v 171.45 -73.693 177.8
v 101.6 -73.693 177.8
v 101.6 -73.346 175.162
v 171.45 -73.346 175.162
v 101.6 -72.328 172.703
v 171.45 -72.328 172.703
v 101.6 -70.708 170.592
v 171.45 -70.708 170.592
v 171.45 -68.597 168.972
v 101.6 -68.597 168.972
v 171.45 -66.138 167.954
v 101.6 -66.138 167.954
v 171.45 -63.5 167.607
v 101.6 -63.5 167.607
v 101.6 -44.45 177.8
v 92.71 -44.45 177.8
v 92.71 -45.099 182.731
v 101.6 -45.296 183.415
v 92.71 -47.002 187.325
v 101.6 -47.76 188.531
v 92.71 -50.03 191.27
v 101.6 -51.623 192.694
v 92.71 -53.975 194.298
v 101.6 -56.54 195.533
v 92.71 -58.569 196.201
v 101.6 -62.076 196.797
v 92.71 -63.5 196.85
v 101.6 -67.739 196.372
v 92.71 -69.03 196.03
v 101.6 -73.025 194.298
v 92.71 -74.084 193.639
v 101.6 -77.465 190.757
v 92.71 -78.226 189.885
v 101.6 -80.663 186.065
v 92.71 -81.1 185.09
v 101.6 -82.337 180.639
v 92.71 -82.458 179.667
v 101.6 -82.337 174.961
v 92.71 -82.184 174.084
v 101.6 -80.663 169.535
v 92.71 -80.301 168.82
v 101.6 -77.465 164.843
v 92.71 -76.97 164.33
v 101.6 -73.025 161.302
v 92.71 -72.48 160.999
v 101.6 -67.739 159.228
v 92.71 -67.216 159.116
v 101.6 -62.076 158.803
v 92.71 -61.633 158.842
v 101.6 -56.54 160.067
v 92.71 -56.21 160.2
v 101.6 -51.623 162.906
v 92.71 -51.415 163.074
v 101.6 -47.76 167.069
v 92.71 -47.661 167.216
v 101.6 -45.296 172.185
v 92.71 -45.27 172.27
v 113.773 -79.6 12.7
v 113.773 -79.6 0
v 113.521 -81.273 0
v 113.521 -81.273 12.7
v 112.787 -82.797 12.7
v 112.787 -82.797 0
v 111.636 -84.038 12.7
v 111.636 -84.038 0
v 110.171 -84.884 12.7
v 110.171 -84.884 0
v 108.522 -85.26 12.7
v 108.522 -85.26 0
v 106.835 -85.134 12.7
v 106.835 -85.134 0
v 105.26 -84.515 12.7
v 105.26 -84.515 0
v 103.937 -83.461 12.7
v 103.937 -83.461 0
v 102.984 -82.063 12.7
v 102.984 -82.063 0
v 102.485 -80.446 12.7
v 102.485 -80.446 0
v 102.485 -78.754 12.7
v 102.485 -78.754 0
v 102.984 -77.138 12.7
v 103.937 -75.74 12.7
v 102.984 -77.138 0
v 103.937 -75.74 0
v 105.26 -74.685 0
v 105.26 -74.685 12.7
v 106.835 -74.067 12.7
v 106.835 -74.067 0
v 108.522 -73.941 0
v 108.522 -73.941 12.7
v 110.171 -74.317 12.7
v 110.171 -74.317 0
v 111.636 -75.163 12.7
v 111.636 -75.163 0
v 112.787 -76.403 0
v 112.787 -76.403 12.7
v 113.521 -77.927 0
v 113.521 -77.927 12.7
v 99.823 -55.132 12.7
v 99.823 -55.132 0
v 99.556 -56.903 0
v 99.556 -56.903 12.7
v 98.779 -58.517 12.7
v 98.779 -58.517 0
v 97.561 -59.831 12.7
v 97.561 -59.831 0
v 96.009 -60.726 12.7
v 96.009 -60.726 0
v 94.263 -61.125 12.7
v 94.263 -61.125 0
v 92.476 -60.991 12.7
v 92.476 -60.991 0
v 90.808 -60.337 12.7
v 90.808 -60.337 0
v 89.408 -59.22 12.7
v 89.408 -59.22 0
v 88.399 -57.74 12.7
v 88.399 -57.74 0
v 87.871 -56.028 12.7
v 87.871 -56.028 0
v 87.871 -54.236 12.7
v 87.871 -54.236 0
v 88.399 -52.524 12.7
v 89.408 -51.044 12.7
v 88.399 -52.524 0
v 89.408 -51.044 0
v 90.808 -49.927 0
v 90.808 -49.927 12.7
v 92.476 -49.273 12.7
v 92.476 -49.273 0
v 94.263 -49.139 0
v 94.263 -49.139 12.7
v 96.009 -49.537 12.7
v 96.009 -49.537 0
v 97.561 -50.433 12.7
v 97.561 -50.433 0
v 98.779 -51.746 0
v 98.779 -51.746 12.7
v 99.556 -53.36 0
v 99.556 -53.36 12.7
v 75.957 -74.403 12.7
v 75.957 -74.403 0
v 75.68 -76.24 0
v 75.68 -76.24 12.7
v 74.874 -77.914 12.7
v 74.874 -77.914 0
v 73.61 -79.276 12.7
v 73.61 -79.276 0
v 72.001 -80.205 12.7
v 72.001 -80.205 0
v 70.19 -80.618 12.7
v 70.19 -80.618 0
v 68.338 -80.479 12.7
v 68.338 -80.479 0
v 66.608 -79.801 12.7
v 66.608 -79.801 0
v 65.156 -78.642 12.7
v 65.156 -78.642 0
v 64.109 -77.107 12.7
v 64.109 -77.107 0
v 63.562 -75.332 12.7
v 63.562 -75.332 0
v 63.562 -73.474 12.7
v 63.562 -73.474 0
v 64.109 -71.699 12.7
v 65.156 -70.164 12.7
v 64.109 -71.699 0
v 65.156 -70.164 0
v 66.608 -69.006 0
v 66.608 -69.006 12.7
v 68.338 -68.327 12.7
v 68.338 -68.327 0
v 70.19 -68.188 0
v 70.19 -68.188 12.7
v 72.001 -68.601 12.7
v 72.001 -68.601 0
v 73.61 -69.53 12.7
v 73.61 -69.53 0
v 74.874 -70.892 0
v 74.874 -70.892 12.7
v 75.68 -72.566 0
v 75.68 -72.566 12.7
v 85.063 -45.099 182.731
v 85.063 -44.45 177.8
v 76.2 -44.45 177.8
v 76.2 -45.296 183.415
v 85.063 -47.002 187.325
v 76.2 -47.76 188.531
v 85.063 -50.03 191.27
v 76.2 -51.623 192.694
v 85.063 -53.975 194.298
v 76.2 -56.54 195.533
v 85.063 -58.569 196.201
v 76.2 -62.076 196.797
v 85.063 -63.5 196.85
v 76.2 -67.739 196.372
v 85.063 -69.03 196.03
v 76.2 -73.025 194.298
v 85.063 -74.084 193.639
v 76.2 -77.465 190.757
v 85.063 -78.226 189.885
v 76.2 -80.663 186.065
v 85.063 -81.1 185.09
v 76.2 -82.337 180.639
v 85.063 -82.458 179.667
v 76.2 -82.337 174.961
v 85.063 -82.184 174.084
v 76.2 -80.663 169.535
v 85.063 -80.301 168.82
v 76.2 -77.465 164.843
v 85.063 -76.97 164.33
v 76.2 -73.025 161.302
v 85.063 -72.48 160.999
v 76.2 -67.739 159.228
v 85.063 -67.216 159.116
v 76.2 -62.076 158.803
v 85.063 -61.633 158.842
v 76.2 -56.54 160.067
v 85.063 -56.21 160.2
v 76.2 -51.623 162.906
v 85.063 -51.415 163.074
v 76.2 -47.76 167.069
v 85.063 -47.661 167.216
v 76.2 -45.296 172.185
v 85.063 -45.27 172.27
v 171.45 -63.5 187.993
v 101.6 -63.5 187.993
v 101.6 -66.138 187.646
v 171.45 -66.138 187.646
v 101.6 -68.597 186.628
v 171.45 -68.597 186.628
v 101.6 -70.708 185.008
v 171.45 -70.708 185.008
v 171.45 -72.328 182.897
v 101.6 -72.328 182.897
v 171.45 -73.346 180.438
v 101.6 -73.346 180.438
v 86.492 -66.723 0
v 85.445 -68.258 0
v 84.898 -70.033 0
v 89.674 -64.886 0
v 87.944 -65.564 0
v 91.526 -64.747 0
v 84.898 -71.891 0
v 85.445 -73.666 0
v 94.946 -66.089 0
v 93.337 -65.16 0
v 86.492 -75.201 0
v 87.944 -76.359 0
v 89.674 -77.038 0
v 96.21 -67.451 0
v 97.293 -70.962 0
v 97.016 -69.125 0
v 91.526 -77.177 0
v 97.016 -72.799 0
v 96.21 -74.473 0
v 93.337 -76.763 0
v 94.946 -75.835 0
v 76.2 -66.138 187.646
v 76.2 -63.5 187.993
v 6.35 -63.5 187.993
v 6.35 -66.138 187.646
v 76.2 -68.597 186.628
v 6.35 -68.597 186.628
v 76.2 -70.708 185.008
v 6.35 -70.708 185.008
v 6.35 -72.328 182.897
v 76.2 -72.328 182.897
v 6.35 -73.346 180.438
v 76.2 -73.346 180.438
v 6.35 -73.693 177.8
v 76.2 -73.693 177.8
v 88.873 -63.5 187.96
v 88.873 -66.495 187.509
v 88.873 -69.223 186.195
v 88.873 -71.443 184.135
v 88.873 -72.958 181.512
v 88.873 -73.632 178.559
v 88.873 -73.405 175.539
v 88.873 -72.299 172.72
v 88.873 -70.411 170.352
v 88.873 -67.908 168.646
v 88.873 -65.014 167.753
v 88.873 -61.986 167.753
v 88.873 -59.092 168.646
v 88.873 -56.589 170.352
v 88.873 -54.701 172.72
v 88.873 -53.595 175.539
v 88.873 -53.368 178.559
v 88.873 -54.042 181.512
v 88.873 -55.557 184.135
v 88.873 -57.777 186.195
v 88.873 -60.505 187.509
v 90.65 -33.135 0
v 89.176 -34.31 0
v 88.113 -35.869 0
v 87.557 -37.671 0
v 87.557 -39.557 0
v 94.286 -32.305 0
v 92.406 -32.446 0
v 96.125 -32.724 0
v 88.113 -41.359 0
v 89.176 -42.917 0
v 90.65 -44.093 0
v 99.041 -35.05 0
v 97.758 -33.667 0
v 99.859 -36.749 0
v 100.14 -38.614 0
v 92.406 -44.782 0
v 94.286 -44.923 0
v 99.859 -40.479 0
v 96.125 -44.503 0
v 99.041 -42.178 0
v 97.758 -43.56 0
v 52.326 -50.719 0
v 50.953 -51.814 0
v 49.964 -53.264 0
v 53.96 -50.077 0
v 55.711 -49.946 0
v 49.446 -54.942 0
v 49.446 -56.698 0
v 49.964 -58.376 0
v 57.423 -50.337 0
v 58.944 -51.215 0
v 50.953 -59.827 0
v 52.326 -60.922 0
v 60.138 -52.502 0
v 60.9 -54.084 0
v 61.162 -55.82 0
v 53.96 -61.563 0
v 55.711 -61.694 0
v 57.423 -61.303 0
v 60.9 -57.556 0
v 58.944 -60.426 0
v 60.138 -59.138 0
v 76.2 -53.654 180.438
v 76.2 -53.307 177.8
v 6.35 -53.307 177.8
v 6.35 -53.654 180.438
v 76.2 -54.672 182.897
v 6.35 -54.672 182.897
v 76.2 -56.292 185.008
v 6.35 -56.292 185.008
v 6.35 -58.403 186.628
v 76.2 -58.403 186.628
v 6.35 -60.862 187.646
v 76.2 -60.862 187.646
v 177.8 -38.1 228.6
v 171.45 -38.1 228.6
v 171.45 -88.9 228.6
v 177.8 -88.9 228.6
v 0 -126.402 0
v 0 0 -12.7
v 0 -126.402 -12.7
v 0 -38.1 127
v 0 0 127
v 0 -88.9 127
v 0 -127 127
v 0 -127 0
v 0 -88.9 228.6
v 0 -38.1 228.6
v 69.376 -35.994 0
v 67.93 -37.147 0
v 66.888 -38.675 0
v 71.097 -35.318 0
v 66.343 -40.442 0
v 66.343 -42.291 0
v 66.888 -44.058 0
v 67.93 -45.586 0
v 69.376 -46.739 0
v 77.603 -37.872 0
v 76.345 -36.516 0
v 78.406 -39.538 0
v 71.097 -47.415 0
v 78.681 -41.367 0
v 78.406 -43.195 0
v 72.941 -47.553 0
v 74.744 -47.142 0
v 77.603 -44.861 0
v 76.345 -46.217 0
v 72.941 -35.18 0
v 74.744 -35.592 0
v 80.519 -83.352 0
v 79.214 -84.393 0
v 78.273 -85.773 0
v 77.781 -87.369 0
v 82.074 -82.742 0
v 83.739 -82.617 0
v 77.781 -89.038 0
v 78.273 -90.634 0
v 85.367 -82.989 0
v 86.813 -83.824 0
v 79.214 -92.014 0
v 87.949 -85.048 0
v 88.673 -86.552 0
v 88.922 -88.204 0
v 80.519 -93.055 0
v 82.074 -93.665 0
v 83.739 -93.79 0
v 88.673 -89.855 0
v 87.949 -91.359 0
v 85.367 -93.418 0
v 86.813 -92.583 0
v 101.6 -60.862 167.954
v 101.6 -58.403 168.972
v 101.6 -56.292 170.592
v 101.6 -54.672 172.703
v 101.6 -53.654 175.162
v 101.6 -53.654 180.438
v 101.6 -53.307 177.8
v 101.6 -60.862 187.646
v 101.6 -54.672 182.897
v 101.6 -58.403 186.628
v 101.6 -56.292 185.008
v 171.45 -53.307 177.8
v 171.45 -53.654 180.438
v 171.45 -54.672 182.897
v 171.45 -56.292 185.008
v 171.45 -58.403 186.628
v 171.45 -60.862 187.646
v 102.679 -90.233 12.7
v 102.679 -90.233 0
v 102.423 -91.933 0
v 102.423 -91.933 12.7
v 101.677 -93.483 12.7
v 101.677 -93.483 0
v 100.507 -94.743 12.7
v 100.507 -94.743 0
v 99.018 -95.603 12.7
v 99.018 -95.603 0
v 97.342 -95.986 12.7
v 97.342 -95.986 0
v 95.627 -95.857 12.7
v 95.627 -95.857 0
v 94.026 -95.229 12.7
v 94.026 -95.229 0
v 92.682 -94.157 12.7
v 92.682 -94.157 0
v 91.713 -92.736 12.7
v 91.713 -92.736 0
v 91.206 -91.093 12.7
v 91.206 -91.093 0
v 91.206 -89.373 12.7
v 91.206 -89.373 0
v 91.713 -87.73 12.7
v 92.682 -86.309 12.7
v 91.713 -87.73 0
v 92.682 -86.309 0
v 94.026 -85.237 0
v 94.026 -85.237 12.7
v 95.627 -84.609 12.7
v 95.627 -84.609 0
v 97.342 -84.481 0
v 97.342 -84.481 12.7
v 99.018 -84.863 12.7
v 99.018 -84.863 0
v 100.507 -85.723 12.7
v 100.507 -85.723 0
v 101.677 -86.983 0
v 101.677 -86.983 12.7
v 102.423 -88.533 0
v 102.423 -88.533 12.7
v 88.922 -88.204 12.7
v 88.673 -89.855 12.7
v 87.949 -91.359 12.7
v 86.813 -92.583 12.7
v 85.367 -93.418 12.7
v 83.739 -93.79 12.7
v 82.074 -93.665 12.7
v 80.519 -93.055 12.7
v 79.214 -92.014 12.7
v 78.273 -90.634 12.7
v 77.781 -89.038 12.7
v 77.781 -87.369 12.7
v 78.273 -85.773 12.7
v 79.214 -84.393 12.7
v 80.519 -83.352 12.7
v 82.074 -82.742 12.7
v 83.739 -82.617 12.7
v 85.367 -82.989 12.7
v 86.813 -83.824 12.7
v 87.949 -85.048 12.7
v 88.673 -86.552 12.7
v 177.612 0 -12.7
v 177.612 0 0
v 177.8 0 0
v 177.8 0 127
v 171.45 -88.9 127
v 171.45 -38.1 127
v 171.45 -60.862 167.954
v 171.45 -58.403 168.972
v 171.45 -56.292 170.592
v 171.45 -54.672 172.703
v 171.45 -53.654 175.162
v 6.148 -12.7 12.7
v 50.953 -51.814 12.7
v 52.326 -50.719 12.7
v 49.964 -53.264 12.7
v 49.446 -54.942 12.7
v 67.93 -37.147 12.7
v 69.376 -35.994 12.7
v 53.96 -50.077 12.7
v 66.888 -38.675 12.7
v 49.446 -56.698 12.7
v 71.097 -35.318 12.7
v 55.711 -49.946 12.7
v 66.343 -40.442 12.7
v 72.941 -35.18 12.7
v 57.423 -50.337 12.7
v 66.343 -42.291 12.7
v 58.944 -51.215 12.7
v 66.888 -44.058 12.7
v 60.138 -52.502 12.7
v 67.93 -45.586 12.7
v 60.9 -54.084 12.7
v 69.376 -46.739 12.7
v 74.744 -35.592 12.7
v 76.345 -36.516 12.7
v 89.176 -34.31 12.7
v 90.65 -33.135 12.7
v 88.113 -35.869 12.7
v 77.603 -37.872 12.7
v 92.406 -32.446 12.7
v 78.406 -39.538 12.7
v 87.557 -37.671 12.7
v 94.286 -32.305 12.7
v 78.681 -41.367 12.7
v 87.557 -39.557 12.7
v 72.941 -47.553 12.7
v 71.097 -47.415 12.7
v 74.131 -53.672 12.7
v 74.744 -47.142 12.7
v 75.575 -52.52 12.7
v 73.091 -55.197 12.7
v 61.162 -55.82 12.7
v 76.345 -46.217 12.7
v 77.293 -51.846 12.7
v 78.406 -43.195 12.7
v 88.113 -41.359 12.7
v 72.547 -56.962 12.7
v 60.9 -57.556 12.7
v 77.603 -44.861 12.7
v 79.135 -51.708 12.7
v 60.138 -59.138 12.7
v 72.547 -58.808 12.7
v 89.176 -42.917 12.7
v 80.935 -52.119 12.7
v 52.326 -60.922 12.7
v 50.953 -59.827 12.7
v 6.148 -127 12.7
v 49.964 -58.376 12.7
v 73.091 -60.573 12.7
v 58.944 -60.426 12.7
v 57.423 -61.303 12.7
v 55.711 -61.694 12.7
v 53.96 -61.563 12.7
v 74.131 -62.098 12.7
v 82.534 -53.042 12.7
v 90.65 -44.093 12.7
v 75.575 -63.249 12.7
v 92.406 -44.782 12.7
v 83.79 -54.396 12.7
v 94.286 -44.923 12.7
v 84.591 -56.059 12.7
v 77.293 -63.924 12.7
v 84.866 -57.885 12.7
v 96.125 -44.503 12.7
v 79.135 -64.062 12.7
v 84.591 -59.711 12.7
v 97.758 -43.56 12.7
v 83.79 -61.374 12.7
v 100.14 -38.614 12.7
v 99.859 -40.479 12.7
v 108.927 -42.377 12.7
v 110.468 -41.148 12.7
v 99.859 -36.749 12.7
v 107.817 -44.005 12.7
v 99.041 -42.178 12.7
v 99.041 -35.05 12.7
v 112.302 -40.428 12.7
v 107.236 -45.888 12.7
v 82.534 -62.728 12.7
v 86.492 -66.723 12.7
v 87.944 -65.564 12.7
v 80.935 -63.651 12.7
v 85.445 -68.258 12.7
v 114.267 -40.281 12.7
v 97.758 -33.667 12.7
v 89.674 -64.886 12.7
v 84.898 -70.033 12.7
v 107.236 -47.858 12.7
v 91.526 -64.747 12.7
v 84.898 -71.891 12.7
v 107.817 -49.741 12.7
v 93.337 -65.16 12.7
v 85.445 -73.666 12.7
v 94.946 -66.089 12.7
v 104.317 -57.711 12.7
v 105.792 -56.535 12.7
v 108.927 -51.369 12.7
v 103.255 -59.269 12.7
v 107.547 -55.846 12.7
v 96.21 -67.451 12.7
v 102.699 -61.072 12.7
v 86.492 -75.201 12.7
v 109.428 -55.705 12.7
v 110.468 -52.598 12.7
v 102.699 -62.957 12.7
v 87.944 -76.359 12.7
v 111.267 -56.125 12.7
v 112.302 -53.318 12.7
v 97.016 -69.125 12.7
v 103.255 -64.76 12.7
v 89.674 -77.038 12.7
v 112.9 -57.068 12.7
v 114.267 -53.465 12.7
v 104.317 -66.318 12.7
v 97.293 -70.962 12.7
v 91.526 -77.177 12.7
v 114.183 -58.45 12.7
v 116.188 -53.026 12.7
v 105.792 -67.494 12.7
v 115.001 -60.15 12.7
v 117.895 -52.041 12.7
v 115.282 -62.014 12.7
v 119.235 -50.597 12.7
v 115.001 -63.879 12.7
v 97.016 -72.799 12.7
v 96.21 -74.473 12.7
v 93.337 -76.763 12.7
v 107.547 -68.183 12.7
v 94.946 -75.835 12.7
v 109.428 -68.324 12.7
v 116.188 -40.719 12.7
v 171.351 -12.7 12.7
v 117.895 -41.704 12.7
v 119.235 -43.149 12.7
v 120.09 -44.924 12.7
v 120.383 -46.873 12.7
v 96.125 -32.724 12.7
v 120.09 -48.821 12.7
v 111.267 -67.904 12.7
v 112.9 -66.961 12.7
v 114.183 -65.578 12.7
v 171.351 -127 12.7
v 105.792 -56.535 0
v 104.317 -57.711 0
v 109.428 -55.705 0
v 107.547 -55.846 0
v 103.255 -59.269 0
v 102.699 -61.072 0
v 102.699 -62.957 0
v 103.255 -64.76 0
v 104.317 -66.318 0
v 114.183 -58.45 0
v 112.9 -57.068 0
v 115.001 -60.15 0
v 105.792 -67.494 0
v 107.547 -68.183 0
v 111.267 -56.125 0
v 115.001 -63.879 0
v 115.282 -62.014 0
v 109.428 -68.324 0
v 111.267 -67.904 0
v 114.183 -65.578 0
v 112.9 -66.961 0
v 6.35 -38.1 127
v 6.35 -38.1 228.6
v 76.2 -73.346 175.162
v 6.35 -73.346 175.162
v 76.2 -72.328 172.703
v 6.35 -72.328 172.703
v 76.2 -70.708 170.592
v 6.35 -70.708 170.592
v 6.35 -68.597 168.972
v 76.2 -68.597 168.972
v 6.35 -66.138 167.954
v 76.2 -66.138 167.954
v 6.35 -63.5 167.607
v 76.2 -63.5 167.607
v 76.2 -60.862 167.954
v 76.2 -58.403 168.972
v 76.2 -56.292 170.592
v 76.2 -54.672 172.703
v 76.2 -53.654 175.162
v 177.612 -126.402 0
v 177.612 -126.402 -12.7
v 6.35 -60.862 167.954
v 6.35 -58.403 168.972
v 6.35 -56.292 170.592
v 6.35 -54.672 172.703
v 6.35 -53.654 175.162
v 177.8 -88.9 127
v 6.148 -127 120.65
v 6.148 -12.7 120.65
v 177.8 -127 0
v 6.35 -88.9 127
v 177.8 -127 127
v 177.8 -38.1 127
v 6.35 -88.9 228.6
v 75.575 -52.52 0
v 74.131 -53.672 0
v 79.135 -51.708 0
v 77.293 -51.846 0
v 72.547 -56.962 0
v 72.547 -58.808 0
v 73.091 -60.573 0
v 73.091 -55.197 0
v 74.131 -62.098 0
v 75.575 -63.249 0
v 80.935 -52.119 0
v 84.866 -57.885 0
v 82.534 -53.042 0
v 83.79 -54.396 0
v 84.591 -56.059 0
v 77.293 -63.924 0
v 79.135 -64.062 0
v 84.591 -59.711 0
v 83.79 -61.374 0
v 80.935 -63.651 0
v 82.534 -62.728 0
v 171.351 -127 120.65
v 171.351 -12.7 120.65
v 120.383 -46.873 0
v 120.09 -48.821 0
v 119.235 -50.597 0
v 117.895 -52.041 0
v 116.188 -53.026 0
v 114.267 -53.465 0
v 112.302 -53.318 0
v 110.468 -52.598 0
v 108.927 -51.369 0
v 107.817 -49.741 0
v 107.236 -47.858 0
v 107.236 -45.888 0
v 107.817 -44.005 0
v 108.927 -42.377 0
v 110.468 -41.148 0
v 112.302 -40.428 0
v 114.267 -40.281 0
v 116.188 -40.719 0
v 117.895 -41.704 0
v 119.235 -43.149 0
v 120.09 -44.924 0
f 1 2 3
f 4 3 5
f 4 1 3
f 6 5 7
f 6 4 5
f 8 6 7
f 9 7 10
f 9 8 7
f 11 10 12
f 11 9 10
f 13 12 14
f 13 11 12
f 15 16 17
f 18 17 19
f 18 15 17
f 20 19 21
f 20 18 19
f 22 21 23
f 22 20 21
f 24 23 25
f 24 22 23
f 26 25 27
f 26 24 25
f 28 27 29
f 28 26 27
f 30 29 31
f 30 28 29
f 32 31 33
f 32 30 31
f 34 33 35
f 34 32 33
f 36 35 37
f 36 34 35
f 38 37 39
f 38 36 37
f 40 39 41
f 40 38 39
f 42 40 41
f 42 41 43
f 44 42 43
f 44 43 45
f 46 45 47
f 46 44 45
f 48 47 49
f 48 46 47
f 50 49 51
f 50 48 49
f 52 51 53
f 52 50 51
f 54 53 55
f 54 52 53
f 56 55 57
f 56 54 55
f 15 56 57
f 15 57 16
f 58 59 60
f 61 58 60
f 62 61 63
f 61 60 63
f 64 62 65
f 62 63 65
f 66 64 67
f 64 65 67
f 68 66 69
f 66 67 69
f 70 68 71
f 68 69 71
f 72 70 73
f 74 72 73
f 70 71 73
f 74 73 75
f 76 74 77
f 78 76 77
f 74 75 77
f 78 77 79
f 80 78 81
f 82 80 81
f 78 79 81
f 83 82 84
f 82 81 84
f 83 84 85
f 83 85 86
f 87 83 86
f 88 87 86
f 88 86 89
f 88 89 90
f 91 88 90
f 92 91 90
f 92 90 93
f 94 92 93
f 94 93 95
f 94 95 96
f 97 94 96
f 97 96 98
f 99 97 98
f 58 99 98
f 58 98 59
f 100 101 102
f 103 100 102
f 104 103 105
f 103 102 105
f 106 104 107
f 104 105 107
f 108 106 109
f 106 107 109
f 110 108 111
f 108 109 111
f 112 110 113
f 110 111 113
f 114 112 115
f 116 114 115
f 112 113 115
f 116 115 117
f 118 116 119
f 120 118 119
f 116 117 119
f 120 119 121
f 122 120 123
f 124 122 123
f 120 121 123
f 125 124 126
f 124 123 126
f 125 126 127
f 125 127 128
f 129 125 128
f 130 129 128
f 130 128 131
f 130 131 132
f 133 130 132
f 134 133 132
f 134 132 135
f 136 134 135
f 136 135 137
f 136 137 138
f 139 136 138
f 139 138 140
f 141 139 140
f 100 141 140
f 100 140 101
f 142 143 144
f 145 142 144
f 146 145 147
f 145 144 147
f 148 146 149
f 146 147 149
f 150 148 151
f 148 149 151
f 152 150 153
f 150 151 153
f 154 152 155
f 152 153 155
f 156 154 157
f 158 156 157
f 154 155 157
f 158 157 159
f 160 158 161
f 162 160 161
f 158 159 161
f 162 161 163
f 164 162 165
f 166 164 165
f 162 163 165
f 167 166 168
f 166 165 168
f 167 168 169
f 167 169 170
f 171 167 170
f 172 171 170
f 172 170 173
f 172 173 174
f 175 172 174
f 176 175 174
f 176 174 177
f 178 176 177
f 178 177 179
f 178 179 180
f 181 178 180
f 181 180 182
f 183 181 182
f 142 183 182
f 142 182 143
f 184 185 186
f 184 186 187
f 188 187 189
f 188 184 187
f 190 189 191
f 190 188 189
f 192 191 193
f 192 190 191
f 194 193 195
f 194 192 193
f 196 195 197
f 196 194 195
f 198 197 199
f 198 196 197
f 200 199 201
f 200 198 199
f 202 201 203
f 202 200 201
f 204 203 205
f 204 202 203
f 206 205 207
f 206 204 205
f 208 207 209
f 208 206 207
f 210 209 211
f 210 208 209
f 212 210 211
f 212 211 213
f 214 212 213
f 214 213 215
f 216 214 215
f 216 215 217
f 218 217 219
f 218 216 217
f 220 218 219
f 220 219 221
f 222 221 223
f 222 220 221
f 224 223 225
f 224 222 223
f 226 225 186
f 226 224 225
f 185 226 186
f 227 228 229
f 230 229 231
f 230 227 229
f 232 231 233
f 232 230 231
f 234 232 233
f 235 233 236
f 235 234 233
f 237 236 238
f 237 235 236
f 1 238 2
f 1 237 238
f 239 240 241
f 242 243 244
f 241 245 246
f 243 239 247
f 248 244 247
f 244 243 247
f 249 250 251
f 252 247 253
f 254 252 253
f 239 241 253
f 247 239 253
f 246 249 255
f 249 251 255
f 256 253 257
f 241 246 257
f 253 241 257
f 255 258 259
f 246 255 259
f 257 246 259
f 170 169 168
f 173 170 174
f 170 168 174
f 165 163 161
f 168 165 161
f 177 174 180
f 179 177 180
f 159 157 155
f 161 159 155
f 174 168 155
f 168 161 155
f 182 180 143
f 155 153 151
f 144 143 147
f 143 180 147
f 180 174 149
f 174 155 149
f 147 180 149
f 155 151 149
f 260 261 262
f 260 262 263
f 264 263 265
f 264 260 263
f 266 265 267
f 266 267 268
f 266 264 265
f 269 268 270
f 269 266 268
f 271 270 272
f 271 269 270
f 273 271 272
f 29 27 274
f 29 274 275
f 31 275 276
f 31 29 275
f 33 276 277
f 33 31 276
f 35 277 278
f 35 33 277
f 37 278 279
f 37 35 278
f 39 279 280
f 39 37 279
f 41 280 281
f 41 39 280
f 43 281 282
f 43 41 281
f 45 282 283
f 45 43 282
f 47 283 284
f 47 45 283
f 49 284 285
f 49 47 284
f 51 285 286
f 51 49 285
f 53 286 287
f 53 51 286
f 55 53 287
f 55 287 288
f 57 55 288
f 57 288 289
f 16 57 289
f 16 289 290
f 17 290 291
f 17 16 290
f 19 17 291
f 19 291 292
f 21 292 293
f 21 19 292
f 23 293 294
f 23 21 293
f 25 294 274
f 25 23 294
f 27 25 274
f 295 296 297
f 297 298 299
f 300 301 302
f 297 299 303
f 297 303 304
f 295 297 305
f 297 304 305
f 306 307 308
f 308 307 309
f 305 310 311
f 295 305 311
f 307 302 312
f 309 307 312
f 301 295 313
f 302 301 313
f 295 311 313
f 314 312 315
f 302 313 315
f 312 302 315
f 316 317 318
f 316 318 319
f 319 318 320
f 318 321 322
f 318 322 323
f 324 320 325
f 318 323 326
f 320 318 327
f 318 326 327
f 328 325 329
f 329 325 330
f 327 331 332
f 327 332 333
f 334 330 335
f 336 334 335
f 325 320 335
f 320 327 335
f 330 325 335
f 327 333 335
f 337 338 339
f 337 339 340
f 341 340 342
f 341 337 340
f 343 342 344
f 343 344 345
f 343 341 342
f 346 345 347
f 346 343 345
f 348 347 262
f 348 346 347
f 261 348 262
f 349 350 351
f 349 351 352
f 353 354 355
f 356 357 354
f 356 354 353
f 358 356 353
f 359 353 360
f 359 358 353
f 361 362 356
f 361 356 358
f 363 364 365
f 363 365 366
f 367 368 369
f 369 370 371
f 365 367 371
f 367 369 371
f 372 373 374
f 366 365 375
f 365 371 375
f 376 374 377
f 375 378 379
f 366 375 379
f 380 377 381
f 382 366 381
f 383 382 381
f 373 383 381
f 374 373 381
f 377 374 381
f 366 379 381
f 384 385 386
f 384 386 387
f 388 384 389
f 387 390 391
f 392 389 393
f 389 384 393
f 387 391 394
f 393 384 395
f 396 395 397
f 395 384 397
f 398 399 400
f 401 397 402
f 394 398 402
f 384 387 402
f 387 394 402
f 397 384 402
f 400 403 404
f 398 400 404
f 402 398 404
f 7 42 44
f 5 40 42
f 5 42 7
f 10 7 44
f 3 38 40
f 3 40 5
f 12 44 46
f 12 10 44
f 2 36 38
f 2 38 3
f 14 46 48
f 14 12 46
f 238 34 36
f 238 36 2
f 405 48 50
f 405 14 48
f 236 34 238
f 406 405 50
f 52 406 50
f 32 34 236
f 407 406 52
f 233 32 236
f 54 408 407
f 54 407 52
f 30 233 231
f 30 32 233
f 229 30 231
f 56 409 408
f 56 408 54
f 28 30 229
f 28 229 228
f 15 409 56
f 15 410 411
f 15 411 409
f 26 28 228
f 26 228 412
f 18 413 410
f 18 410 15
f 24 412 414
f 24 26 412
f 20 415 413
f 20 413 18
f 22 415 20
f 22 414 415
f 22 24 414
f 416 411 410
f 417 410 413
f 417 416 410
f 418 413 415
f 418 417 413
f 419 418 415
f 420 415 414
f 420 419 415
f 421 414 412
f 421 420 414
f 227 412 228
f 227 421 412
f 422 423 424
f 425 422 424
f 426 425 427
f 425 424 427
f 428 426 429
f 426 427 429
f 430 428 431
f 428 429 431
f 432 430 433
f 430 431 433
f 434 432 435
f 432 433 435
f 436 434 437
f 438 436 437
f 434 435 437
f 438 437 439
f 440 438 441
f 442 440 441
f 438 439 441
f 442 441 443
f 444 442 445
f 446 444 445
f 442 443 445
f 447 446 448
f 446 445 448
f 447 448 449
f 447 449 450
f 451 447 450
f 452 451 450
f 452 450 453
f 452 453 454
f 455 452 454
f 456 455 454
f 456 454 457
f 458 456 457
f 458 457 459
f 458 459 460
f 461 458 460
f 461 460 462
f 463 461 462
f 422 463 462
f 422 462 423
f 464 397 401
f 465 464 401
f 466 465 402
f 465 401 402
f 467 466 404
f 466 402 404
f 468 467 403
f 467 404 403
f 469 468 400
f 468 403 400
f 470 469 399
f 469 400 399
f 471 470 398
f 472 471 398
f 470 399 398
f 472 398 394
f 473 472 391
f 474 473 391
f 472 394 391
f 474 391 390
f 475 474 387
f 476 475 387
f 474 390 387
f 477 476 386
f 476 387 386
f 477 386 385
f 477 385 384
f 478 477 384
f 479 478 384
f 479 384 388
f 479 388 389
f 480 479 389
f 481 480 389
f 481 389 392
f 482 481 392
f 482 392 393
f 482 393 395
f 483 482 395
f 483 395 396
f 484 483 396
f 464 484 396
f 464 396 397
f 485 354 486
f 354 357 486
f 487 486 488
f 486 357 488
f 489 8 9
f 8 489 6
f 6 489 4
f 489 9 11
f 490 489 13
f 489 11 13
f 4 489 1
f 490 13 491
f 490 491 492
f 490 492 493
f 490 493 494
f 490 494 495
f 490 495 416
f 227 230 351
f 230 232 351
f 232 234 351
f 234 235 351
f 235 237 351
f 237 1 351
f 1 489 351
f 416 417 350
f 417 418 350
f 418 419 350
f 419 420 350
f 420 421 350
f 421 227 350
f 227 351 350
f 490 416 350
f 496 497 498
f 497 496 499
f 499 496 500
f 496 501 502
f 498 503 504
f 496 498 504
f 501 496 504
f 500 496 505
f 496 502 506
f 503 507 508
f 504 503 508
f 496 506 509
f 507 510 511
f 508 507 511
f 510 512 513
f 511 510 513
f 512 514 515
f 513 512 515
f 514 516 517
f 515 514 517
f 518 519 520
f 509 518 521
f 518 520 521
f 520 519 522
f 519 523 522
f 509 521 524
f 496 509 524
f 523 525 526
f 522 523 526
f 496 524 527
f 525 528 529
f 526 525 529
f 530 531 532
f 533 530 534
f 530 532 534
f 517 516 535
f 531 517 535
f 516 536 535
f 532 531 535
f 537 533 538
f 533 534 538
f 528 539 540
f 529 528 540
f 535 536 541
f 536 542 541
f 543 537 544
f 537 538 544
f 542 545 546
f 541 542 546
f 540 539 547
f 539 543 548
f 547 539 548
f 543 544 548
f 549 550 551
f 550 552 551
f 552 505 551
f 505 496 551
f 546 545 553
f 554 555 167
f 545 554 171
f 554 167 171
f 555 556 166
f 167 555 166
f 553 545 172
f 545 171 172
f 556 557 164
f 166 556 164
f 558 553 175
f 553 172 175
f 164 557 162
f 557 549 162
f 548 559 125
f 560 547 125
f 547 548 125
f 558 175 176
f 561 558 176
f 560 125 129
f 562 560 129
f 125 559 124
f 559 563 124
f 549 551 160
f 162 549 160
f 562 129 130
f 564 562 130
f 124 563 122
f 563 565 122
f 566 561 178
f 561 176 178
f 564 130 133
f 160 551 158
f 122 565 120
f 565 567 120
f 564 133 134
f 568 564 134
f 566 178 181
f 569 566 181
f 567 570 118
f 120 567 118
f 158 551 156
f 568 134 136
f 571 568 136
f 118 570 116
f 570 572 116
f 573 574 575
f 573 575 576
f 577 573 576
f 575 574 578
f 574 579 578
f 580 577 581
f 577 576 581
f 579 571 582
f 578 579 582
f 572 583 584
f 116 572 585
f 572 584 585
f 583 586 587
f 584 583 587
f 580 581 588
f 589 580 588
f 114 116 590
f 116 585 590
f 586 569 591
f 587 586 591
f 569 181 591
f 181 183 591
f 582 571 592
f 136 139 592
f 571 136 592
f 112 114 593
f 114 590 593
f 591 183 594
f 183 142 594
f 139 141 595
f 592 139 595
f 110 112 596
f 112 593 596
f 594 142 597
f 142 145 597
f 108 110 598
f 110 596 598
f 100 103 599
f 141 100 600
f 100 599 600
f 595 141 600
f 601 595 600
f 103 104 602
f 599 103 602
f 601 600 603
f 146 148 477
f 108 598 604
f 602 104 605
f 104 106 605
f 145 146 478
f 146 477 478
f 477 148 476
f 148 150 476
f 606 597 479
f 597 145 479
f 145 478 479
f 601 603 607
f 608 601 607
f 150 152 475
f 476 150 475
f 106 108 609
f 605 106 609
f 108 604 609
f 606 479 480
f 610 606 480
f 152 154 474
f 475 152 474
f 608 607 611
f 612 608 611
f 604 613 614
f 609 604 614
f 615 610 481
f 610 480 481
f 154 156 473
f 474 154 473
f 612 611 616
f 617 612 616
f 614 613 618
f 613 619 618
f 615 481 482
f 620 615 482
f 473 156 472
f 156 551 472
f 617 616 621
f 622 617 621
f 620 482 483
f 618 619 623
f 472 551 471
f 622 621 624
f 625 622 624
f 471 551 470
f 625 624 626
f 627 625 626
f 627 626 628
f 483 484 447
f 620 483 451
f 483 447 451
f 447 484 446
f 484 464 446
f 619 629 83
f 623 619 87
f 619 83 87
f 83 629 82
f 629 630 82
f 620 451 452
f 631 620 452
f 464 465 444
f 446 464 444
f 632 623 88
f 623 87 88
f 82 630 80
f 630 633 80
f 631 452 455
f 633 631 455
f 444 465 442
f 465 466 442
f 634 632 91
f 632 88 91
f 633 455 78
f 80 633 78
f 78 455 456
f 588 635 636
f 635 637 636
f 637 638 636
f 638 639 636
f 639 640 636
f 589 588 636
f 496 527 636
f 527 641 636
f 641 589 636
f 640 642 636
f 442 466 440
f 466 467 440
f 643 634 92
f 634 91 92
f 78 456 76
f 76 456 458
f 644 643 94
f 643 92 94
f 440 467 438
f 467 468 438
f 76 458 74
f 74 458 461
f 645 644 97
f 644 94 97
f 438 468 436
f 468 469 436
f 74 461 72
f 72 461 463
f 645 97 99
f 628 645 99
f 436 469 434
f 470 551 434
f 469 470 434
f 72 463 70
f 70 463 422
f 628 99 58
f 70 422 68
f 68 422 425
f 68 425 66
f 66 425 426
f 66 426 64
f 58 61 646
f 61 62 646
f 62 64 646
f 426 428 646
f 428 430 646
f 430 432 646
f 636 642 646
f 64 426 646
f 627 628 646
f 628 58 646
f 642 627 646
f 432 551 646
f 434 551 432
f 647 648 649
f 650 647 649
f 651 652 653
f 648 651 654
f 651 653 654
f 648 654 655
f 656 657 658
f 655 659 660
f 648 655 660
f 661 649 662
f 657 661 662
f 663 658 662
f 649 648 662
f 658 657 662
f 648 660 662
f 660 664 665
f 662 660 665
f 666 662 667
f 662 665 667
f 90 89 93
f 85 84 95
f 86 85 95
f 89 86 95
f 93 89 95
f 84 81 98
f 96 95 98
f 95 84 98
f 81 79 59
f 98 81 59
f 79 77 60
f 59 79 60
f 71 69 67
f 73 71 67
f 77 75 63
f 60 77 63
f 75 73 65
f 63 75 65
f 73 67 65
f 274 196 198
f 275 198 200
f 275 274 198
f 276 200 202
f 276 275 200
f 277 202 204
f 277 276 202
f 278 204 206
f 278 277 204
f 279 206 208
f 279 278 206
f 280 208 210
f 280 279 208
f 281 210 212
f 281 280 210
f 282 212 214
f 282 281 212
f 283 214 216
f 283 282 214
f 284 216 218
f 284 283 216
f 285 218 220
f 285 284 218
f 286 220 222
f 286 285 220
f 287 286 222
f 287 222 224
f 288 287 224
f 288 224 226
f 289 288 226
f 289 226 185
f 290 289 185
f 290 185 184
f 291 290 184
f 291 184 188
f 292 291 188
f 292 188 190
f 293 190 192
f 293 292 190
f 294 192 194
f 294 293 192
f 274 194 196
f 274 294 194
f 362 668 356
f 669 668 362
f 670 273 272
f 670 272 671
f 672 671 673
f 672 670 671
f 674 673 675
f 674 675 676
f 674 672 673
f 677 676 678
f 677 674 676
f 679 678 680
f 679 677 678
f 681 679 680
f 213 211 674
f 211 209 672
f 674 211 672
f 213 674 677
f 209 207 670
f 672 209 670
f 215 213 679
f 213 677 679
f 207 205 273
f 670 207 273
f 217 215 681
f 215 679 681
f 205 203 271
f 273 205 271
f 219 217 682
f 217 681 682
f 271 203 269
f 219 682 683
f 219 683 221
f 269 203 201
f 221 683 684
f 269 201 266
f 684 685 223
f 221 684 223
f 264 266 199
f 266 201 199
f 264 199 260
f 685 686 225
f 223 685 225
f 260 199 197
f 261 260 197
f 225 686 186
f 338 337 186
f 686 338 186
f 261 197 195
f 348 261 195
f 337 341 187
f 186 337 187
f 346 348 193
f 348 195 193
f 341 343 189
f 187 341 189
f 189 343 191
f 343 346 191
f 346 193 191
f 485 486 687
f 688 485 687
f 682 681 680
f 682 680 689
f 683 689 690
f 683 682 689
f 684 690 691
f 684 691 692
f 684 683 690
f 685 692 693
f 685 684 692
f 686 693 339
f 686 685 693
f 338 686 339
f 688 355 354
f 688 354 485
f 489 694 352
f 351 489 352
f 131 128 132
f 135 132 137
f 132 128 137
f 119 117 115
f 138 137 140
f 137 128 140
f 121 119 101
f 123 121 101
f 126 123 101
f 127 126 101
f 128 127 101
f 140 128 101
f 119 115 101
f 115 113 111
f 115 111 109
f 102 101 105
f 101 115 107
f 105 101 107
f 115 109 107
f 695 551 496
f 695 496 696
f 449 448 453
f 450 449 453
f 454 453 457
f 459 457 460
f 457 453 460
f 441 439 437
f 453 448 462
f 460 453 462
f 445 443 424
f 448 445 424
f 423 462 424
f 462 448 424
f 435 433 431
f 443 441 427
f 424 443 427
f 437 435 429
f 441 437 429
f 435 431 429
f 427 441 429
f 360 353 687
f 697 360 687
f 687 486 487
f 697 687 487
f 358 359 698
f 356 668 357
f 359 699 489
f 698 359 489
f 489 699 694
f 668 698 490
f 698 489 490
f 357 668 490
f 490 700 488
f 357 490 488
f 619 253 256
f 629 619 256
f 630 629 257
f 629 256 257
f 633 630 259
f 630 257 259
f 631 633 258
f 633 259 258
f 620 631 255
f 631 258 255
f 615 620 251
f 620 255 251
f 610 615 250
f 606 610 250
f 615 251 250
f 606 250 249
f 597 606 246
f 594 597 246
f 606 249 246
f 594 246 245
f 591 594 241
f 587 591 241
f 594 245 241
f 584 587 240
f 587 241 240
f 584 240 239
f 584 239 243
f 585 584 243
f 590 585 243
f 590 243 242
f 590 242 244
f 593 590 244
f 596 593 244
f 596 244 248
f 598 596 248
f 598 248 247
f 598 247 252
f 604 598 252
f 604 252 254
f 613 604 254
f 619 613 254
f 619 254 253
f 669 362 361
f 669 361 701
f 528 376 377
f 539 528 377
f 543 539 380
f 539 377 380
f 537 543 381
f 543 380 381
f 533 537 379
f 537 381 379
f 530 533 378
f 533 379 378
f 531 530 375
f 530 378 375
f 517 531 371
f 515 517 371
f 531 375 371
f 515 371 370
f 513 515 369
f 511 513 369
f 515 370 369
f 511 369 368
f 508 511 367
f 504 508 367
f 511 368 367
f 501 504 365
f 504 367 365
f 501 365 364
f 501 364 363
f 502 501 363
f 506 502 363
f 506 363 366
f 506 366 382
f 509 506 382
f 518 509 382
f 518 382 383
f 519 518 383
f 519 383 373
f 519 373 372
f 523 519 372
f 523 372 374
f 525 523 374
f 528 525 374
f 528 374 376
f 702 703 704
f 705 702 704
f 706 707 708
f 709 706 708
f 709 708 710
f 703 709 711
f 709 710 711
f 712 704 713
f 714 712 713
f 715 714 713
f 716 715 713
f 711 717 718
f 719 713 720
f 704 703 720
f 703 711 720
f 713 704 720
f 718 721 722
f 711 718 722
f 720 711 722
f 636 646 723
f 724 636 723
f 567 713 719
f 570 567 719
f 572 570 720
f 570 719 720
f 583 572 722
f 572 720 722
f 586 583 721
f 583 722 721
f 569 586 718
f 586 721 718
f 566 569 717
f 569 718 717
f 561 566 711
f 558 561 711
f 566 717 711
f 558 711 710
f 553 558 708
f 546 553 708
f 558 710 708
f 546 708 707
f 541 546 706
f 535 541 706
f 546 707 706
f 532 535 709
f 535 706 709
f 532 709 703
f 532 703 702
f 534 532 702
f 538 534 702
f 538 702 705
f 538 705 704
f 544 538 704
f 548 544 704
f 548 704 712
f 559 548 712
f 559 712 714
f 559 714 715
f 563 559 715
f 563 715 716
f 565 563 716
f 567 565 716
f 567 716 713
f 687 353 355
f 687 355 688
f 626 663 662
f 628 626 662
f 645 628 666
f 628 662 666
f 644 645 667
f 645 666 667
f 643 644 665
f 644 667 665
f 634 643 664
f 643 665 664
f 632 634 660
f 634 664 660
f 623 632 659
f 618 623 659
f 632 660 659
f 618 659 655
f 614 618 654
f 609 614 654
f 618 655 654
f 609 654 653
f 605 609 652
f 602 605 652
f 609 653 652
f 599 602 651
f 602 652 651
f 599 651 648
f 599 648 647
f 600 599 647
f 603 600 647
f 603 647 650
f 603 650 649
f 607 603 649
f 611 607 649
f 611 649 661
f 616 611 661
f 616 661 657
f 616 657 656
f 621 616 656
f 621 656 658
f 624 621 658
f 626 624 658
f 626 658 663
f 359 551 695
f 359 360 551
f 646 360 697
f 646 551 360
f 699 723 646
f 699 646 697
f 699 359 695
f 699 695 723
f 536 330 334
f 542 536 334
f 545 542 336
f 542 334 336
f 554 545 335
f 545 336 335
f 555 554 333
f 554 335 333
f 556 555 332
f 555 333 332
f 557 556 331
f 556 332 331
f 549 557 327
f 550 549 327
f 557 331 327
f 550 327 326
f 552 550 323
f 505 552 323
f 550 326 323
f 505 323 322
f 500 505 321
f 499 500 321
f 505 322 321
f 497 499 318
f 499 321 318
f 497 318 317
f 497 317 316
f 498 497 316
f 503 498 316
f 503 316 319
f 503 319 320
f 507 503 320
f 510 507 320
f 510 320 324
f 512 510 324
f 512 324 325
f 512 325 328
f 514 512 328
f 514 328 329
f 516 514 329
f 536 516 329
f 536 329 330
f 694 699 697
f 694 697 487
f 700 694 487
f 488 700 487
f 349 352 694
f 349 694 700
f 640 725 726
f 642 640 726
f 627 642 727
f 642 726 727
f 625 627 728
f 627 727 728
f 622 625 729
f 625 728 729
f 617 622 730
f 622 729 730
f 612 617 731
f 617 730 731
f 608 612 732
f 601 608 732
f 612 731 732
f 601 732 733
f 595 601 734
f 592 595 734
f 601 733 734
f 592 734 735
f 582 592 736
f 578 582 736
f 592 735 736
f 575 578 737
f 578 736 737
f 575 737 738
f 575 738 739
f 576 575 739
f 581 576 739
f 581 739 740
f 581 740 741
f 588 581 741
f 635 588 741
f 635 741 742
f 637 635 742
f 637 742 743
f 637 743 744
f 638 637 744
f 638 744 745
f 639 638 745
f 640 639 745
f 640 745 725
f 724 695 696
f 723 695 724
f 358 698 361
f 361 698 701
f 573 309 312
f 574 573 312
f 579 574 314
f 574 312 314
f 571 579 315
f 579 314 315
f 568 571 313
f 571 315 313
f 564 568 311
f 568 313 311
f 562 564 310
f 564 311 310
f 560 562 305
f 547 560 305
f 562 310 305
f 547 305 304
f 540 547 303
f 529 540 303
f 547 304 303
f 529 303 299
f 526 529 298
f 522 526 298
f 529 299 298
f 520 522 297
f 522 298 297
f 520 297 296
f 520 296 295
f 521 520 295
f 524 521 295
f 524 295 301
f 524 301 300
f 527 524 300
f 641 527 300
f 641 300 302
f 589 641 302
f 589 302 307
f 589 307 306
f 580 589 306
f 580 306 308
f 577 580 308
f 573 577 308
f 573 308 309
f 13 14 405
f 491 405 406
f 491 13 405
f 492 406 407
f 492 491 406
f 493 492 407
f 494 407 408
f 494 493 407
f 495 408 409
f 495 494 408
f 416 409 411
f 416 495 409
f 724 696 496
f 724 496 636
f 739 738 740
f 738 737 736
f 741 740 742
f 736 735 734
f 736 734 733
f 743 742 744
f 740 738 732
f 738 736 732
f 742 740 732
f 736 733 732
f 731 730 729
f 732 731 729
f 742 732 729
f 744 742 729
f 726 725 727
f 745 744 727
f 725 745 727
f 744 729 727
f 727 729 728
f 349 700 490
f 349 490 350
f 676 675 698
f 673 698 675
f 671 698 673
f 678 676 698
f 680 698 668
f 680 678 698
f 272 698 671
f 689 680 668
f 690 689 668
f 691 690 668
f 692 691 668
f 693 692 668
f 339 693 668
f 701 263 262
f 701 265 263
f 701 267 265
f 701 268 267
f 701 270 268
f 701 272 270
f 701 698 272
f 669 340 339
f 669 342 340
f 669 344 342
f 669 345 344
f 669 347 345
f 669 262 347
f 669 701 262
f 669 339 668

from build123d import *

# Parameters (mm, degrees)
F0_W      = 177.8
F0_H      = 228.6
F1_DEPTH  = 127
F2_W      = 38.1
F2_H      = 101.6
F3_DEPTH  = 177.8
F4_W      = 38.1
F4_H      = 101.6
F5_DEPTH  = 177.8
F6_R      = 6.199251325
F7_DEPTH  = 177.8
F8_W      = 165.1
F8_H      = 50.8
F9_DEPTH  = 101.6
F11_DEPTH = 174.498
F12_W     = 165.2032374404
F12_H     = 107.95
F13_DEPTH = 114.3
F15_R     = 5.6020191421
F16_DEPTH = 25.4
F17_R     = 5.6755182408
F18_DEPTH = 25.4
F19_R     = 6.2324496131
F20_DEPTH = 25.4
F21_R     = 6.232442208
F22_DEPTH = 25.4
F23_R     = 6.1943233013
F24_DEPTH = 25.4
F25_R     = 6.3267373896
F26_DEPTH = 25.4
F27_R     = 5.7686573469
F28_DEPTH = 25.4
F29_R     = 6.0099495699
F30_DEPTH = 25.4
F31_R     = 5.8905425669
F32_DEPTH = 25.4
F33_R     = 6.2038720929
F34_DEPTH = 25.4
F35_R     = 6.3267305002
F36_DEPTH = 25.4
F37_R     = 6.6105067138
F38_DEPTH = 25.4
F40_R     = 19.05
F40_R_2   = 10.1933204062
F41_DEPTH = 12.7
F42_W     = 177.6115447283
F42_H     = 126.4018714428
F43_DEPTH = 12.7


with BuildPart() as f1:
    # F0 (on Front) → F1 (new body)
    with BuildSketch(Plane.XZ):
        with Locations((88.9, 114.3)):
            Rectangle(F0_W, F0_H)
    extrude(amount=F1_DEPTH)

    # F2 (on face) → F3 (cut)
    with BuildSketch(Plane.YZ.offset(177.8)):
        with Locations((-107.95, 177.8)):
            Rectangle(F2_W, F2_H)
    extrude(amount=-F3_DEPTH, mode=Mode.SUBTRACT)

    # F4 (on face) → F5 (cut)
    with BuildSketch(Plane.YZ.offset(177.8)):
        with Locations((-19.05, 177.8)):
            Rectangle(F4_W, F4_H)
    extrude(amount=-F5_DEPTH, mode=Mode.SUBTRACT)

    # F6 (on face) → F7 (join)
    with BuildSketch(Plane(origin=(0, 0, 0), x_dir=(0, -1, 0), z_dir=(-1, 0, 0))):
        with Locations((61.0702037811, 211.2230211496)):
            Circle(F6_R)
    extrude(amount=-F7_DEPTH)

    # F8 (on face) → F9 (cut)
    with BuildSketch(Plane.XY.offset(228.6)):
        with Locations((88.9, -63.5)):
            Rectangle(F8_W, F8_H)
    extrude(amount=-F9_DEPTH, mode=Mode.SUBTRACT)

    # F10 (on face) → F11 (join)
    with BuildSketch(Plane.YZ.offset(177.8)):
        with BuildLine():
            Line((-63.5, 177.8), (-63.5, 187.9933204062))
            ThreePointArc((-63.5, 187.9933204062), (-70.707765982, 185.007765982), (-73.6933204062, 177.8))
            Line((-73.6933204062, 177.8), (-63.5, 177.8))
        make_face()
        with BuildLine():
            Line((-63.5, 167.6066795938), (-63.5, 177.8))
            Line((-63.5, 177.8), (-73.6933204062, 177.8))
            ThreePointArc((-73.6933204062, 177.8), (-70.707765982, 170.592234018), (-63.5, 167.6066795938))
        make_face()
        with BuildLine():
            Line((-53.3066795938, 177.8), (-63.5, 177.8))
            Line((-63.5, 177.8), (-63.5, 167.6066795938))
            ThreePointArc((-63.5, 167.6066795938), (-56.292234018, 170.592234018), (-53.3066795938, 177.8))
        make_face()
        with BuildLine():
            ThreePointArc((-53.3066795938, 177.8), (-56.292234018, 185.007765982), (-63.5, 187.9933204062))
            Line((-63.5, 187.9933204062), (-63.5, 177.8))
            Line((-63.5, 177.8), (-53.3066795938, 177.8))
        make_face()
    extrude(amount=-F11_DEPTH)

    # F12 (on face) → F13 (cut)
    with BuildSketch(Plane.XZ.offset(127)):
        with Locations((88.7493521441, 66.675)):
            Rectangle(F12_W, F12_H)
    extrude(amount=-F13_DEPTH, mode=Mode.SUBTRACT)

    # F15 (on face) → F16 (cut)
    with BuildSketch(Plane(origin=(0, 0, 0), x_dir=(1, 0, 0), z_dir=(0, 0, -1))):
        with Locations((83.3201929927, 88.2035493851)):
            Circle(F15_R)
    extrude(amount=-F16_DEPTH, mode=Mode.SUBTRACT)

    # F17 (on face) → F18 (cut)
    with BuildSketch(Plane(origin=(0, 0, 0), x_dir=(1, 0, 0), z_dir=(0, 0, -1))):
        with Locations((108.0974861979, 79.6003267169)):
            Circle(F17_R)
    extrude(amount=-F18_DEPTH, mode=Mode.SUBTRACT)

    # F19 (on face) → F20 (cut)
    with BuildSketch(Plane(origin=(0, 0, 0), x_dir=(1, 0, 0), z_dir=(0, 0, -1))):
        with Locations((91.0604074597, 70.961818099)):
            Circle(F19_R)
    extrude(amount=-F20_DEPTH, mode=Mode.SUBTRACT)

    # F21 (on face) → F22 (cut)
    with BuildSketch(Plane(origin=(0, 0, 0), x_dir=(1, 0, 0), z_dir=(0, 0, -1))):
        with Locations((69.7244107723, 74.4031071663)):
            Circle(F21_R)
    extrude(amount=-F22_DEPTH, mode=Mode.SUBTRACT)

    # F23 (on face) → F24 (cut)
    with BuildSketch(Plane(origin=(0, 0, 0), x_dir=(1, 0, 0), z_dir=(0, 0, -1))):
        with Locations((78.6717683077, 57.8849166632)):
            Circle(F23_R)
    extrude(amount=-F24_DEPTH, mode=Mode.SUBTRACT)

    # F25 (on face) → F26 (cut)
    with BuildSketch(Plane(origin=(0, 0, 0), x_dir=(1, 0, 0), z_dir=(0, 0, -1))):
        with Locations((108.9551225305, 62.0144642889)):
            Circle(F25_R)
    extrude(amount=-F26_DEPTH, mode=Mode.SUBTRACT)

    # F27 (on face) → F28 (cut)
    with BuildSketch(Plane(origin=(0, 0, 0), x_dir=(1, 0, 0), z_dir=(0, 0, -1))):
        with Locations((96.9106033444, 90.2330502868)):
            Circle(F27_R)
    extrude(amount=-F28_DEPTH, mode=Mode.SUBTRACT)

    # F29 (on face) → F30 (cut)
    with BuildSketch(Plane(origin=(0, 0, 0), x_dir=(1, 0, 0), z_dir=(0, 0, -1))):
        with Locations((93.8134491444, 55.1318824291)):
            Circle(F29_R)
    extrude(amount=-F30_DEPTH, mode=Mode.SUBTRACT)

    # F31 (on face) → F32 (cut)
    with BuildSketch(Plane(origin=(0, 0, 0), x_dir=(1, 0, 0), z_dir=(0, 0, -1))):
        with Locations((55.2709922194, 55.8201409876)):
            Circle(F31_R)
    extrude(amount=-F32_DEPTH, mode=Mode.SUBTRACT)

    # F33 (on face) → F34 (cut)
    with BuildSketch(Plane(origin=(0, 0, 0), x_dir=(1, 0, 0), z_dir=(0, 0, -1))):
        with Locations((72.4774450064, 41.3667224348)):
            Circle(F33_R)
    extrude(amount=-F34_DEPTH, mode=Mode.SUBTRACT)

    # F35 (on face) → F36 (cut)
    with BuildSketch(Plane(origin=(0, 0, 0), x_dir=(1, 0, 0), z_dir=(0, 0, -1))):
        with Locations((93.8134491444, 38.6136882007)):
            Circle(F35_R)
    extrude(amount=-F36_DEPTH, mode=Mode.SUBTRACT)

    # F37 (on face) → F38 (cut)
    with BuildSketch(Plane(origin=(0, 0, 0), x_dir=(1, 0, 0), z_dir=(0, 0, -1))):
        with Locations((113.7729287148, 46.8727871776)):
            Circle(F37_R)
    extrude(amount=-F38_DEPTH, mode=Mode.SUBTRACT)

    # F40 (on offset) → F41 (join, symmetric)
    with BuildSketch(Plane.YZ.offset(88.9)):
        with Locations((-63.5, 177.8)):
            Circle(F40_R)
        with Locations((-63.5, 177.8)):
            Circle(F40_R_2, mode=Mode.SUBTRACT)
    extrude(amount=F41_DEPTH, both=True)

    # F42 (on face) → F43 (join)
    with BuildSketch(Plane(origin=(0, 0, 0), x_dir=(1, 0, 0), z_dir=(0, 0, -1))):
        with Locations((88.8057723641, 63.2009357214)):
            Rectangle(F42_W, F42_H)
    extrude(amount=F43_DEPTH)

    # F45 (on offset) → F46 (revolve, cut)
    with BuildSketch(Plane.XZ.offset(63.5)):
        Polygon((88.8730700588, 187.96), (92.71, 196.85), (85.0630700588, 196.85), align=None)
    revolve(axis=Axis((88.71205585, -63.5, 177.8), (1, 0, 0)), mode=Mode.SUBTRACT)


solid = f1.part
